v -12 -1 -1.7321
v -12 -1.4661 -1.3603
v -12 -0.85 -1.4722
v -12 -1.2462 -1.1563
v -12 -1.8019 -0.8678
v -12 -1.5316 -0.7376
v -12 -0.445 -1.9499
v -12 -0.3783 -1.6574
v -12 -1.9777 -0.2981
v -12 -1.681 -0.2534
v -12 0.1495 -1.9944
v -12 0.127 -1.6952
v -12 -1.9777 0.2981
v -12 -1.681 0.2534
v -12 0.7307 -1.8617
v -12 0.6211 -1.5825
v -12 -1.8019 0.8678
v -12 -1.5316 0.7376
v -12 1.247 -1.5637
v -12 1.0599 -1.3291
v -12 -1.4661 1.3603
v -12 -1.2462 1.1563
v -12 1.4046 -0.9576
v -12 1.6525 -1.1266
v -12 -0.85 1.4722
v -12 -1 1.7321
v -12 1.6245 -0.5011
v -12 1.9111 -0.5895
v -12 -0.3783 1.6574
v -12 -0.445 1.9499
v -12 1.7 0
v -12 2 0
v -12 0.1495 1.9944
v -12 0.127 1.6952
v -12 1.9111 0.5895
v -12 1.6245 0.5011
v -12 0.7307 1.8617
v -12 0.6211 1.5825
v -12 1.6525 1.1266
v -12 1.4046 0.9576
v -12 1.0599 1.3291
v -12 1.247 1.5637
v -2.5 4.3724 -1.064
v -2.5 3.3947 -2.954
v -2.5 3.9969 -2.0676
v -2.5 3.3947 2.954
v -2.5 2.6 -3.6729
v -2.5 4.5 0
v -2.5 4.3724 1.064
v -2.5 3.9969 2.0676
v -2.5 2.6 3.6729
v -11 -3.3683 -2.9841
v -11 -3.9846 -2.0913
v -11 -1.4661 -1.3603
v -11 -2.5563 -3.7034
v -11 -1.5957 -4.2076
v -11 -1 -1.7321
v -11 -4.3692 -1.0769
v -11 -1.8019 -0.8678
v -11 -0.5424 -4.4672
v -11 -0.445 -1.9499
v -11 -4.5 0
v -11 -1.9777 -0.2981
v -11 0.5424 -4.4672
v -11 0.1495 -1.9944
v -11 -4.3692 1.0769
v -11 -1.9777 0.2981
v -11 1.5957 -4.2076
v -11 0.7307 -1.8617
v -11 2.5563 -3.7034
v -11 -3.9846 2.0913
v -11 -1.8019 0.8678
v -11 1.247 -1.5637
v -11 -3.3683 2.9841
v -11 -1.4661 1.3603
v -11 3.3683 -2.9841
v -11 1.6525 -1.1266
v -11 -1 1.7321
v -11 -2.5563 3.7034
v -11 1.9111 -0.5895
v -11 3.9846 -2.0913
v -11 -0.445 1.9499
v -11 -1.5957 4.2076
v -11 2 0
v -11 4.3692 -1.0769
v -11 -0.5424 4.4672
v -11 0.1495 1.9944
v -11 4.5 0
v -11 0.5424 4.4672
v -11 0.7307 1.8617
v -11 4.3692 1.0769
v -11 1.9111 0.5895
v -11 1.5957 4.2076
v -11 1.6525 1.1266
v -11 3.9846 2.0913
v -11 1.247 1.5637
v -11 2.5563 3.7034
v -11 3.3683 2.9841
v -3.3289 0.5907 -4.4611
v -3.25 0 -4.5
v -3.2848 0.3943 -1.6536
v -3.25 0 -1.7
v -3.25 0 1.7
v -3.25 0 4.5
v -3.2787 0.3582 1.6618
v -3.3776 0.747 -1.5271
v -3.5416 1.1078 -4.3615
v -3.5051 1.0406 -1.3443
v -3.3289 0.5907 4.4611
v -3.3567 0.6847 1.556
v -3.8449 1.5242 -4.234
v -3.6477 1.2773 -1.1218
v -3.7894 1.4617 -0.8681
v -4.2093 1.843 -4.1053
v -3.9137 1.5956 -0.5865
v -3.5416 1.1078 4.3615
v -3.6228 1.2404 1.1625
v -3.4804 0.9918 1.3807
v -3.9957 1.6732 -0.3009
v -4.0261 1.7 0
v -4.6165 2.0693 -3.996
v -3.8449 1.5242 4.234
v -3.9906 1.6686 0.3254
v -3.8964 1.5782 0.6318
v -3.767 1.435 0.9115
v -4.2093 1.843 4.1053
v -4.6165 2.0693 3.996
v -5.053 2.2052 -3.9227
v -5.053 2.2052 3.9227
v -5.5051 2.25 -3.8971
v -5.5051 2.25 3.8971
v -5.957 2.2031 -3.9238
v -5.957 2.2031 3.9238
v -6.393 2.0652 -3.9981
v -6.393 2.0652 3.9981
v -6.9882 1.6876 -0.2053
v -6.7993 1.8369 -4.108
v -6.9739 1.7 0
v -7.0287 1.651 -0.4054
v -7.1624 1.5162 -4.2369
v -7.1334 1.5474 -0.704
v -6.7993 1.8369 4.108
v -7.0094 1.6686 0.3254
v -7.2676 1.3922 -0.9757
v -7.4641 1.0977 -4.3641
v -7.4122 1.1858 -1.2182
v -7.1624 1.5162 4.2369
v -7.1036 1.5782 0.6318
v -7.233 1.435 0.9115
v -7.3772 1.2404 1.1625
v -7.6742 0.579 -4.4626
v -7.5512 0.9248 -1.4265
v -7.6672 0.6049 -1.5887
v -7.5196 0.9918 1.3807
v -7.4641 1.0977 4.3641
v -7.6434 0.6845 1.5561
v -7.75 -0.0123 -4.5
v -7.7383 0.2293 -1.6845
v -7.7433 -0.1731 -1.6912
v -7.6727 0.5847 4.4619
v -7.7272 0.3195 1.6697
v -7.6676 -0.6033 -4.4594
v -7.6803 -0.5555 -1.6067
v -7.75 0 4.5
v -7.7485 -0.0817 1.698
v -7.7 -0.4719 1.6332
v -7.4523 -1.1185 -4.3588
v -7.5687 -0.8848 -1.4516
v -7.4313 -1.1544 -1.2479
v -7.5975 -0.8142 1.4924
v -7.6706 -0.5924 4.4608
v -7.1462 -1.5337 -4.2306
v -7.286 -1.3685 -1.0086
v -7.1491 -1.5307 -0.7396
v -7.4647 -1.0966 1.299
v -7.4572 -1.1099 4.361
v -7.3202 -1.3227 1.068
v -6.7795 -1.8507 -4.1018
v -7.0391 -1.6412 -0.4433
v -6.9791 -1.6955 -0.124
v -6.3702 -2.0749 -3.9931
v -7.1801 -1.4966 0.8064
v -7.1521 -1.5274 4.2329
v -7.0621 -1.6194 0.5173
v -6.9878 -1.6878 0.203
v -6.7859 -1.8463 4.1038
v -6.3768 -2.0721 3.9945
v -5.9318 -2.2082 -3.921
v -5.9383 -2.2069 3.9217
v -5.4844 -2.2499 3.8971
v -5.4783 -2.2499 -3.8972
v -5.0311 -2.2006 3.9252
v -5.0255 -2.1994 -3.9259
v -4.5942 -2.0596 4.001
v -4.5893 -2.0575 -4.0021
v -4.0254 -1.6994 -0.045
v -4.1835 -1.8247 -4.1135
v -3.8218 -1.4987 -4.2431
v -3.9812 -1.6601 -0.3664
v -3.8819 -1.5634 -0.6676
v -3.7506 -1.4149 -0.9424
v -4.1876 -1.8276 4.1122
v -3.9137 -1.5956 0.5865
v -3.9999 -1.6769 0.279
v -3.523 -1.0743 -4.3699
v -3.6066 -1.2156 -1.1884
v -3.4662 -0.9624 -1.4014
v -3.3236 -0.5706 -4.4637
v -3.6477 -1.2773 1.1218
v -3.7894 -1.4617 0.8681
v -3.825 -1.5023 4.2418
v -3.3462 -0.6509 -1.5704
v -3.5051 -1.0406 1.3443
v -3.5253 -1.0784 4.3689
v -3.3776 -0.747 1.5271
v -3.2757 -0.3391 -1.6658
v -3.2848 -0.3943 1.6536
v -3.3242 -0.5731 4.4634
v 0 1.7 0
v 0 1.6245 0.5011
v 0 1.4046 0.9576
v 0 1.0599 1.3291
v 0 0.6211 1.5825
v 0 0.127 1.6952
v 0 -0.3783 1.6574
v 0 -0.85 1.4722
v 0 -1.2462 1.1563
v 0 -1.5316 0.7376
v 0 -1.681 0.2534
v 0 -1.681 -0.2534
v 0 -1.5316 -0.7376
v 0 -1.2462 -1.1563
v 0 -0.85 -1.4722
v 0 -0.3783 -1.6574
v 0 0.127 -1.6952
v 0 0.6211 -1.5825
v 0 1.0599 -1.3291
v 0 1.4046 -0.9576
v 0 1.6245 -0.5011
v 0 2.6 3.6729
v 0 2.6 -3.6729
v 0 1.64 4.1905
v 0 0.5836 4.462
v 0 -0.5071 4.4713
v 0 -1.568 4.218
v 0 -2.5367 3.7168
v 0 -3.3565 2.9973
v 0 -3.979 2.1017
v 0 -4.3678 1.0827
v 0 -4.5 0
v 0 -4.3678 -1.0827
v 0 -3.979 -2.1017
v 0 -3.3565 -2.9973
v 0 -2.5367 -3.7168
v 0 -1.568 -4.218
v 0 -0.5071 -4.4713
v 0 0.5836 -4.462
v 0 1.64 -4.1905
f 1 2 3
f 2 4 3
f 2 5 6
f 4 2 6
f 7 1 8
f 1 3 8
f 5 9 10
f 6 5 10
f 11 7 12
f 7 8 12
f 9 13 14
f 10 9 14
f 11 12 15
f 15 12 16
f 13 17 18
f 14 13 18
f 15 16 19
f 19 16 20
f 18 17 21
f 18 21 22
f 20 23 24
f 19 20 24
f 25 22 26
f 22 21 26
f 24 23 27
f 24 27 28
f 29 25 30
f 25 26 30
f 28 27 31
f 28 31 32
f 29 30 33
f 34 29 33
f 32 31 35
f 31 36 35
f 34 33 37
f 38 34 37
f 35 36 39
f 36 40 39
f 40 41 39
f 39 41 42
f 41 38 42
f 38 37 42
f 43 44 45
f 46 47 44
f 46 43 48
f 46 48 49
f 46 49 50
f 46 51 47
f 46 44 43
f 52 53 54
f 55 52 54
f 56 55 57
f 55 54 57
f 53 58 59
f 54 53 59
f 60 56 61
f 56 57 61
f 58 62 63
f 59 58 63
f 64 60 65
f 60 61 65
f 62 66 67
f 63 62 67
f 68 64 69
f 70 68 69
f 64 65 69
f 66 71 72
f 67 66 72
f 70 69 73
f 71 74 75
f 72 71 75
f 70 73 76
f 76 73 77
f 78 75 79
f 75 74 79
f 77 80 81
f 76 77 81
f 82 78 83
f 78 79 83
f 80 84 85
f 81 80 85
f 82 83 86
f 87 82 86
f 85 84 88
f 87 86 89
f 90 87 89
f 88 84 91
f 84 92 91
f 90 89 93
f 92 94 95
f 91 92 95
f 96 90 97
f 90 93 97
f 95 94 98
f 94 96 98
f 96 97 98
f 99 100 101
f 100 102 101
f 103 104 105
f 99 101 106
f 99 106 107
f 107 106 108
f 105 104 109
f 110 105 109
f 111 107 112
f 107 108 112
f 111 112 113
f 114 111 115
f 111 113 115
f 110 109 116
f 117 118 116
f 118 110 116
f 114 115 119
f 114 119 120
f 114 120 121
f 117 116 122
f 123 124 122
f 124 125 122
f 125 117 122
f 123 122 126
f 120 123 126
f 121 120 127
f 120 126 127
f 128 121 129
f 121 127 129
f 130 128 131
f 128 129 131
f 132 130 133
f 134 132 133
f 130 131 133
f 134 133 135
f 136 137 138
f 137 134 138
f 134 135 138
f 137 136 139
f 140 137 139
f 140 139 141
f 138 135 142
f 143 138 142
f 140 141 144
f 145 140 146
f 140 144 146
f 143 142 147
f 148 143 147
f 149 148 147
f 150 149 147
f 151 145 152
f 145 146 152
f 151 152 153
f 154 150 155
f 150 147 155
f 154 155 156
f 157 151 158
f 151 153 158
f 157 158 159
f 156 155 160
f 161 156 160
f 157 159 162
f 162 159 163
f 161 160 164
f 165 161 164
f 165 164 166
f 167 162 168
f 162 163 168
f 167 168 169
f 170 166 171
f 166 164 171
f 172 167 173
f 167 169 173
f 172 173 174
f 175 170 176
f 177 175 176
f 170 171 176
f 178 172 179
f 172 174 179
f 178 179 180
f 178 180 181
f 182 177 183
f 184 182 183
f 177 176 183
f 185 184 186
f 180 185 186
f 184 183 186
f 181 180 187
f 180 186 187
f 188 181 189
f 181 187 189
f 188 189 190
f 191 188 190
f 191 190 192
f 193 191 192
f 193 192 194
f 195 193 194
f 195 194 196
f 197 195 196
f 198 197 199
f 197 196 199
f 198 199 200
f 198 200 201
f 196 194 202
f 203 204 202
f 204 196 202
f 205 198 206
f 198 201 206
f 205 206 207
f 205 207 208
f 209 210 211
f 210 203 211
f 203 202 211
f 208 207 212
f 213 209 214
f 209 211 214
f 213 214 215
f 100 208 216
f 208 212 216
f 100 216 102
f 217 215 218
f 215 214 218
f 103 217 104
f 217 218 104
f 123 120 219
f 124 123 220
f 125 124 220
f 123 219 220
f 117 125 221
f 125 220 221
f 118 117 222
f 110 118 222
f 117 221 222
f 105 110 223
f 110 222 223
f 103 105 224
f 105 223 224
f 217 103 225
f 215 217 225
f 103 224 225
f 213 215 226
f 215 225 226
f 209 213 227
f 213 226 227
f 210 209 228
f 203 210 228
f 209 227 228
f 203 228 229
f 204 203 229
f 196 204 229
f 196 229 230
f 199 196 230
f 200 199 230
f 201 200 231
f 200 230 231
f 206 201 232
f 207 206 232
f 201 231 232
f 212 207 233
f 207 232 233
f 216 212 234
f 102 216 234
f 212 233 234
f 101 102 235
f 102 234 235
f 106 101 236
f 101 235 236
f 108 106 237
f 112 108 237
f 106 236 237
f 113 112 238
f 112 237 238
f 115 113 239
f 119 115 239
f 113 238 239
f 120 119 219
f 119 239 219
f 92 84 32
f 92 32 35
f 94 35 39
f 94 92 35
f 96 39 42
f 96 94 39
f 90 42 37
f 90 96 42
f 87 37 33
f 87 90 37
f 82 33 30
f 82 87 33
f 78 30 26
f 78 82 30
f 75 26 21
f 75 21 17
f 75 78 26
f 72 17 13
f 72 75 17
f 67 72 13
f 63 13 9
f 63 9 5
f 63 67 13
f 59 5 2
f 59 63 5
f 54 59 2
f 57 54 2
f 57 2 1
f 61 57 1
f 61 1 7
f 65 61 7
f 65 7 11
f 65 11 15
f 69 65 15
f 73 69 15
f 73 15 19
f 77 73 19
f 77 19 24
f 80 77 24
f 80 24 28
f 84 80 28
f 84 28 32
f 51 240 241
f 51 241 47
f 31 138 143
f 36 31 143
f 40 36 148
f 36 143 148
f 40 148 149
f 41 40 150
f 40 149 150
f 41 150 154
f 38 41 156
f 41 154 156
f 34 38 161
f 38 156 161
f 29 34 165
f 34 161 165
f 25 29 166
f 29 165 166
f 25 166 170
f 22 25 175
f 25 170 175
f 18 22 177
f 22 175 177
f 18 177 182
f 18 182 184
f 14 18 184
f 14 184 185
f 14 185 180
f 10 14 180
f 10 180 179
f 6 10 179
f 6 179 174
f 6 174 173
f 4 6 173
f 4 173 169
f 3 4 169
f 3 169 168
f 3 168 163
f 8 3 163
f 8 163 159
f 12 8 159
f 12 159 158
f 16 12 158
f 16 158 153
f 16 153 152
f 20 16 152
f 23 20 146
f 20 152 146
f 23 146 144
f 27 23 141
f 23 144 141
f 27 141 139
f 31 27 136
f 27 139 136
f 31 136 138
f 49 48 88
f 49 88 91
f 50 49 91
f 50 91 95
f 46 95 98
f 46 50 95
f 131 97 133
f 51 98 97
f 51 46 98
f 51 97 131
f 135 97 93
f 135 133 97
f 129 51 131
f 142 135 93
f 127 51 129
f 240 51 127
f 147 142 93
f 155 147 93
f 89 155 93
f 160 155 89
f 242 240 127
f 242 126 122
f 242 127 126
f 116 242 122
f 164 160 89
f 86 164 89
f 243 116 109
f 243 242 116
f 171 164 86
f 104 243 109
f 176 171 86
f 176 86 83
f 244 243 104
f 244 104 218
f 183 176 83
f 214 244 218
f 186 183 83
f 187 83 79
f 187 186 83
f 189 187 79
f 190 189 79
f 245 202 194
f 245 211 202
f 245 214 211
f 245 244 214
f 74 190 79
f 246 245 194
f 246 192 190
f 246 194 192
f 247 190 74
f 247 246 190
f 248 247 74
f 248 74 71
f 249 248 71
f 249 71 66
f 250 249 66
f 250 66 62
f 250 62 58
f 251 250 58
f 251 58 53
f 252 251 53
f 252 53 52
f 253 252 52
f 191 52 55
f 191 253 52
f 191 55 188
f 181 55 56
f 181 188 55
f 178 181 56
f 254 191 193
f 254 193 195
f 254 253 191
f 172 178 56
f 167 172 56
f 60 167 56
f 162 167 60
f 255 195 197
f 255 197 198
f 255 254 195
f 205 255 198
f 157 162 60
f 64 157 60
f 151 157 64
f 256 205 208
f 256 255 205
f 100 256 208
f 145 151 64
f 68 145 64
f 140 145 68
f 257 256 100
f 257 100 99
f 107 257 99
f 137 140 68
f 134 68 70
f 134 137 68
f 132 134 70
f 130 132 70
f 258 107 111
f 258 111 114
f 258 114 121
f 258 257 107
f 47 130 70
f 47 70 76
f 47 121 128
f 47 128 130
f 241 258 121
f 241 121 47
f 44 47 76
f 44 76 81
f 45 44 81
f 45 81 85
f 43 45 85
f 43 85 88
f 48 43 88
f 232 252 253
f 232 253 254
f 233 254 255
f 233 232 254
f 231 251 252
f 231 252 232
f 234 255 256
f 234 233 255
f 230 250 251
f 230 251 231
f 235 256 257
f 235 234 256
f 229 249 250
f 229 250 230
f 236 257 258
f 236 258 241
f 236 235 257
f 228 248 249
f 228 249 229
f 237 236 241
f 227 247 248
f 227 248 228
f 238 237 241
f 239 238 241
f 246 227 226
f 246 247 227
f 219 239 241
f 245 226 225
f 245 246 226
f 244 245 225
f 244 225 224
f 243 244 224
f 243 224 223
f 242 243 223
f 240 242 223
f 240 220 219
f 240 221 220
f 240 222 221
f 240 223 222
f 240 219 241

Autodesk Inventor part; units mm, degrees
ref_plane "YZ-Ebene" through (0, 0, 0) normal (1, 0, 0) x (0, 1, 0)
ref_plane "XZ-Ebene" through (0, 0, 0) normal (0, 1, 0) x (-1, 0, 0)
sketch "Skizze1" plane through (0, 0, 0) normal (0, 0, 1) x (1, 0, 0)
  line L0 (-14.4, 0) -> (2.4, 0) projected
  line L1 (0, -0.9) -> (0, 5.4) projected
  line L2 (-12, 1.7) -> (-12, 2)
  line L3 (-12, 2) -> (-11, 2)
  line L4 (-11, 2) -> (-11, 4.5)
  line L5 (-11, 4.5) -> (0, 4.5)
  line L6 (-12, 1.7) -> (0, 1.7)
  line L7 (0, 4.5) -> (0, 1.7)
  point P0 (0, 0)
  dimension "d1" = 3.4
  dimension "d2" = 4
  dimension "d3" = 11
  dimension "d4" = 12
  dimension "d5" = 9
revolve "Umdrehung1" add sketch "Skizze1" angle 360 about axis through (-10, 0, 0) along (1, 0, 0)
ref_plane "Arbeitsebene1" through (-5.5, 0, 4.5) normal (0, 0, 1) x (1, 0, 0)
sketch "Skizze2" plane through (-5.5, 0, 4.5) normal (0, 0, 1) x (1, 0, 0)
  line L0 (-5.5, 4.5) -> (5.5, 4.5) projected
  line L1 (5.5, -4.5) -> (5.5, 4.5) projected
  line L2 (3, 4.5) -> (5.5, 4.5)
  line L3 (5.5, 4.5) -> (5.5, 2.6)
  line L4 (5.5, 2.6) -> (3, 2.6)
  line L5 (3, 2.6) -> (3, 4.5)
  point P0 (5.5, 0)
  dimension "d9" = 1.9
  dimension "d10" = 2.5
extrude "Extrusion1" cut sketch "Skizze2" against normal through all
ref_plane "Arbeitsebene2" through (-5.5, 0, 4.5) normal (0, 0, 1) x (1, 0, 0)
sketch "Skizze3" plane through (-5.5, 0, 4.5) normal (0, 0, 1) x (1, 0, 0)
  line L0 (-8.9, 0) -> (7.9, 0) projected
  line L1 (-5.5, -4.5) -> (-5.5, 4.5) projected
  line L2 (5.5, -4.5) -> (5.5, 2.6) projected
  circle A0 centre (0, 0) radius 2.25
  point P0 (5.5, 0)
  dimension "d13" = 4.5
  dimension "d14" = 5.5
extrude "Extrusion2" cut sketch "Skizze3" against normal through all
properties part number "Schließbahn_ra8846s" material "Stahl"
